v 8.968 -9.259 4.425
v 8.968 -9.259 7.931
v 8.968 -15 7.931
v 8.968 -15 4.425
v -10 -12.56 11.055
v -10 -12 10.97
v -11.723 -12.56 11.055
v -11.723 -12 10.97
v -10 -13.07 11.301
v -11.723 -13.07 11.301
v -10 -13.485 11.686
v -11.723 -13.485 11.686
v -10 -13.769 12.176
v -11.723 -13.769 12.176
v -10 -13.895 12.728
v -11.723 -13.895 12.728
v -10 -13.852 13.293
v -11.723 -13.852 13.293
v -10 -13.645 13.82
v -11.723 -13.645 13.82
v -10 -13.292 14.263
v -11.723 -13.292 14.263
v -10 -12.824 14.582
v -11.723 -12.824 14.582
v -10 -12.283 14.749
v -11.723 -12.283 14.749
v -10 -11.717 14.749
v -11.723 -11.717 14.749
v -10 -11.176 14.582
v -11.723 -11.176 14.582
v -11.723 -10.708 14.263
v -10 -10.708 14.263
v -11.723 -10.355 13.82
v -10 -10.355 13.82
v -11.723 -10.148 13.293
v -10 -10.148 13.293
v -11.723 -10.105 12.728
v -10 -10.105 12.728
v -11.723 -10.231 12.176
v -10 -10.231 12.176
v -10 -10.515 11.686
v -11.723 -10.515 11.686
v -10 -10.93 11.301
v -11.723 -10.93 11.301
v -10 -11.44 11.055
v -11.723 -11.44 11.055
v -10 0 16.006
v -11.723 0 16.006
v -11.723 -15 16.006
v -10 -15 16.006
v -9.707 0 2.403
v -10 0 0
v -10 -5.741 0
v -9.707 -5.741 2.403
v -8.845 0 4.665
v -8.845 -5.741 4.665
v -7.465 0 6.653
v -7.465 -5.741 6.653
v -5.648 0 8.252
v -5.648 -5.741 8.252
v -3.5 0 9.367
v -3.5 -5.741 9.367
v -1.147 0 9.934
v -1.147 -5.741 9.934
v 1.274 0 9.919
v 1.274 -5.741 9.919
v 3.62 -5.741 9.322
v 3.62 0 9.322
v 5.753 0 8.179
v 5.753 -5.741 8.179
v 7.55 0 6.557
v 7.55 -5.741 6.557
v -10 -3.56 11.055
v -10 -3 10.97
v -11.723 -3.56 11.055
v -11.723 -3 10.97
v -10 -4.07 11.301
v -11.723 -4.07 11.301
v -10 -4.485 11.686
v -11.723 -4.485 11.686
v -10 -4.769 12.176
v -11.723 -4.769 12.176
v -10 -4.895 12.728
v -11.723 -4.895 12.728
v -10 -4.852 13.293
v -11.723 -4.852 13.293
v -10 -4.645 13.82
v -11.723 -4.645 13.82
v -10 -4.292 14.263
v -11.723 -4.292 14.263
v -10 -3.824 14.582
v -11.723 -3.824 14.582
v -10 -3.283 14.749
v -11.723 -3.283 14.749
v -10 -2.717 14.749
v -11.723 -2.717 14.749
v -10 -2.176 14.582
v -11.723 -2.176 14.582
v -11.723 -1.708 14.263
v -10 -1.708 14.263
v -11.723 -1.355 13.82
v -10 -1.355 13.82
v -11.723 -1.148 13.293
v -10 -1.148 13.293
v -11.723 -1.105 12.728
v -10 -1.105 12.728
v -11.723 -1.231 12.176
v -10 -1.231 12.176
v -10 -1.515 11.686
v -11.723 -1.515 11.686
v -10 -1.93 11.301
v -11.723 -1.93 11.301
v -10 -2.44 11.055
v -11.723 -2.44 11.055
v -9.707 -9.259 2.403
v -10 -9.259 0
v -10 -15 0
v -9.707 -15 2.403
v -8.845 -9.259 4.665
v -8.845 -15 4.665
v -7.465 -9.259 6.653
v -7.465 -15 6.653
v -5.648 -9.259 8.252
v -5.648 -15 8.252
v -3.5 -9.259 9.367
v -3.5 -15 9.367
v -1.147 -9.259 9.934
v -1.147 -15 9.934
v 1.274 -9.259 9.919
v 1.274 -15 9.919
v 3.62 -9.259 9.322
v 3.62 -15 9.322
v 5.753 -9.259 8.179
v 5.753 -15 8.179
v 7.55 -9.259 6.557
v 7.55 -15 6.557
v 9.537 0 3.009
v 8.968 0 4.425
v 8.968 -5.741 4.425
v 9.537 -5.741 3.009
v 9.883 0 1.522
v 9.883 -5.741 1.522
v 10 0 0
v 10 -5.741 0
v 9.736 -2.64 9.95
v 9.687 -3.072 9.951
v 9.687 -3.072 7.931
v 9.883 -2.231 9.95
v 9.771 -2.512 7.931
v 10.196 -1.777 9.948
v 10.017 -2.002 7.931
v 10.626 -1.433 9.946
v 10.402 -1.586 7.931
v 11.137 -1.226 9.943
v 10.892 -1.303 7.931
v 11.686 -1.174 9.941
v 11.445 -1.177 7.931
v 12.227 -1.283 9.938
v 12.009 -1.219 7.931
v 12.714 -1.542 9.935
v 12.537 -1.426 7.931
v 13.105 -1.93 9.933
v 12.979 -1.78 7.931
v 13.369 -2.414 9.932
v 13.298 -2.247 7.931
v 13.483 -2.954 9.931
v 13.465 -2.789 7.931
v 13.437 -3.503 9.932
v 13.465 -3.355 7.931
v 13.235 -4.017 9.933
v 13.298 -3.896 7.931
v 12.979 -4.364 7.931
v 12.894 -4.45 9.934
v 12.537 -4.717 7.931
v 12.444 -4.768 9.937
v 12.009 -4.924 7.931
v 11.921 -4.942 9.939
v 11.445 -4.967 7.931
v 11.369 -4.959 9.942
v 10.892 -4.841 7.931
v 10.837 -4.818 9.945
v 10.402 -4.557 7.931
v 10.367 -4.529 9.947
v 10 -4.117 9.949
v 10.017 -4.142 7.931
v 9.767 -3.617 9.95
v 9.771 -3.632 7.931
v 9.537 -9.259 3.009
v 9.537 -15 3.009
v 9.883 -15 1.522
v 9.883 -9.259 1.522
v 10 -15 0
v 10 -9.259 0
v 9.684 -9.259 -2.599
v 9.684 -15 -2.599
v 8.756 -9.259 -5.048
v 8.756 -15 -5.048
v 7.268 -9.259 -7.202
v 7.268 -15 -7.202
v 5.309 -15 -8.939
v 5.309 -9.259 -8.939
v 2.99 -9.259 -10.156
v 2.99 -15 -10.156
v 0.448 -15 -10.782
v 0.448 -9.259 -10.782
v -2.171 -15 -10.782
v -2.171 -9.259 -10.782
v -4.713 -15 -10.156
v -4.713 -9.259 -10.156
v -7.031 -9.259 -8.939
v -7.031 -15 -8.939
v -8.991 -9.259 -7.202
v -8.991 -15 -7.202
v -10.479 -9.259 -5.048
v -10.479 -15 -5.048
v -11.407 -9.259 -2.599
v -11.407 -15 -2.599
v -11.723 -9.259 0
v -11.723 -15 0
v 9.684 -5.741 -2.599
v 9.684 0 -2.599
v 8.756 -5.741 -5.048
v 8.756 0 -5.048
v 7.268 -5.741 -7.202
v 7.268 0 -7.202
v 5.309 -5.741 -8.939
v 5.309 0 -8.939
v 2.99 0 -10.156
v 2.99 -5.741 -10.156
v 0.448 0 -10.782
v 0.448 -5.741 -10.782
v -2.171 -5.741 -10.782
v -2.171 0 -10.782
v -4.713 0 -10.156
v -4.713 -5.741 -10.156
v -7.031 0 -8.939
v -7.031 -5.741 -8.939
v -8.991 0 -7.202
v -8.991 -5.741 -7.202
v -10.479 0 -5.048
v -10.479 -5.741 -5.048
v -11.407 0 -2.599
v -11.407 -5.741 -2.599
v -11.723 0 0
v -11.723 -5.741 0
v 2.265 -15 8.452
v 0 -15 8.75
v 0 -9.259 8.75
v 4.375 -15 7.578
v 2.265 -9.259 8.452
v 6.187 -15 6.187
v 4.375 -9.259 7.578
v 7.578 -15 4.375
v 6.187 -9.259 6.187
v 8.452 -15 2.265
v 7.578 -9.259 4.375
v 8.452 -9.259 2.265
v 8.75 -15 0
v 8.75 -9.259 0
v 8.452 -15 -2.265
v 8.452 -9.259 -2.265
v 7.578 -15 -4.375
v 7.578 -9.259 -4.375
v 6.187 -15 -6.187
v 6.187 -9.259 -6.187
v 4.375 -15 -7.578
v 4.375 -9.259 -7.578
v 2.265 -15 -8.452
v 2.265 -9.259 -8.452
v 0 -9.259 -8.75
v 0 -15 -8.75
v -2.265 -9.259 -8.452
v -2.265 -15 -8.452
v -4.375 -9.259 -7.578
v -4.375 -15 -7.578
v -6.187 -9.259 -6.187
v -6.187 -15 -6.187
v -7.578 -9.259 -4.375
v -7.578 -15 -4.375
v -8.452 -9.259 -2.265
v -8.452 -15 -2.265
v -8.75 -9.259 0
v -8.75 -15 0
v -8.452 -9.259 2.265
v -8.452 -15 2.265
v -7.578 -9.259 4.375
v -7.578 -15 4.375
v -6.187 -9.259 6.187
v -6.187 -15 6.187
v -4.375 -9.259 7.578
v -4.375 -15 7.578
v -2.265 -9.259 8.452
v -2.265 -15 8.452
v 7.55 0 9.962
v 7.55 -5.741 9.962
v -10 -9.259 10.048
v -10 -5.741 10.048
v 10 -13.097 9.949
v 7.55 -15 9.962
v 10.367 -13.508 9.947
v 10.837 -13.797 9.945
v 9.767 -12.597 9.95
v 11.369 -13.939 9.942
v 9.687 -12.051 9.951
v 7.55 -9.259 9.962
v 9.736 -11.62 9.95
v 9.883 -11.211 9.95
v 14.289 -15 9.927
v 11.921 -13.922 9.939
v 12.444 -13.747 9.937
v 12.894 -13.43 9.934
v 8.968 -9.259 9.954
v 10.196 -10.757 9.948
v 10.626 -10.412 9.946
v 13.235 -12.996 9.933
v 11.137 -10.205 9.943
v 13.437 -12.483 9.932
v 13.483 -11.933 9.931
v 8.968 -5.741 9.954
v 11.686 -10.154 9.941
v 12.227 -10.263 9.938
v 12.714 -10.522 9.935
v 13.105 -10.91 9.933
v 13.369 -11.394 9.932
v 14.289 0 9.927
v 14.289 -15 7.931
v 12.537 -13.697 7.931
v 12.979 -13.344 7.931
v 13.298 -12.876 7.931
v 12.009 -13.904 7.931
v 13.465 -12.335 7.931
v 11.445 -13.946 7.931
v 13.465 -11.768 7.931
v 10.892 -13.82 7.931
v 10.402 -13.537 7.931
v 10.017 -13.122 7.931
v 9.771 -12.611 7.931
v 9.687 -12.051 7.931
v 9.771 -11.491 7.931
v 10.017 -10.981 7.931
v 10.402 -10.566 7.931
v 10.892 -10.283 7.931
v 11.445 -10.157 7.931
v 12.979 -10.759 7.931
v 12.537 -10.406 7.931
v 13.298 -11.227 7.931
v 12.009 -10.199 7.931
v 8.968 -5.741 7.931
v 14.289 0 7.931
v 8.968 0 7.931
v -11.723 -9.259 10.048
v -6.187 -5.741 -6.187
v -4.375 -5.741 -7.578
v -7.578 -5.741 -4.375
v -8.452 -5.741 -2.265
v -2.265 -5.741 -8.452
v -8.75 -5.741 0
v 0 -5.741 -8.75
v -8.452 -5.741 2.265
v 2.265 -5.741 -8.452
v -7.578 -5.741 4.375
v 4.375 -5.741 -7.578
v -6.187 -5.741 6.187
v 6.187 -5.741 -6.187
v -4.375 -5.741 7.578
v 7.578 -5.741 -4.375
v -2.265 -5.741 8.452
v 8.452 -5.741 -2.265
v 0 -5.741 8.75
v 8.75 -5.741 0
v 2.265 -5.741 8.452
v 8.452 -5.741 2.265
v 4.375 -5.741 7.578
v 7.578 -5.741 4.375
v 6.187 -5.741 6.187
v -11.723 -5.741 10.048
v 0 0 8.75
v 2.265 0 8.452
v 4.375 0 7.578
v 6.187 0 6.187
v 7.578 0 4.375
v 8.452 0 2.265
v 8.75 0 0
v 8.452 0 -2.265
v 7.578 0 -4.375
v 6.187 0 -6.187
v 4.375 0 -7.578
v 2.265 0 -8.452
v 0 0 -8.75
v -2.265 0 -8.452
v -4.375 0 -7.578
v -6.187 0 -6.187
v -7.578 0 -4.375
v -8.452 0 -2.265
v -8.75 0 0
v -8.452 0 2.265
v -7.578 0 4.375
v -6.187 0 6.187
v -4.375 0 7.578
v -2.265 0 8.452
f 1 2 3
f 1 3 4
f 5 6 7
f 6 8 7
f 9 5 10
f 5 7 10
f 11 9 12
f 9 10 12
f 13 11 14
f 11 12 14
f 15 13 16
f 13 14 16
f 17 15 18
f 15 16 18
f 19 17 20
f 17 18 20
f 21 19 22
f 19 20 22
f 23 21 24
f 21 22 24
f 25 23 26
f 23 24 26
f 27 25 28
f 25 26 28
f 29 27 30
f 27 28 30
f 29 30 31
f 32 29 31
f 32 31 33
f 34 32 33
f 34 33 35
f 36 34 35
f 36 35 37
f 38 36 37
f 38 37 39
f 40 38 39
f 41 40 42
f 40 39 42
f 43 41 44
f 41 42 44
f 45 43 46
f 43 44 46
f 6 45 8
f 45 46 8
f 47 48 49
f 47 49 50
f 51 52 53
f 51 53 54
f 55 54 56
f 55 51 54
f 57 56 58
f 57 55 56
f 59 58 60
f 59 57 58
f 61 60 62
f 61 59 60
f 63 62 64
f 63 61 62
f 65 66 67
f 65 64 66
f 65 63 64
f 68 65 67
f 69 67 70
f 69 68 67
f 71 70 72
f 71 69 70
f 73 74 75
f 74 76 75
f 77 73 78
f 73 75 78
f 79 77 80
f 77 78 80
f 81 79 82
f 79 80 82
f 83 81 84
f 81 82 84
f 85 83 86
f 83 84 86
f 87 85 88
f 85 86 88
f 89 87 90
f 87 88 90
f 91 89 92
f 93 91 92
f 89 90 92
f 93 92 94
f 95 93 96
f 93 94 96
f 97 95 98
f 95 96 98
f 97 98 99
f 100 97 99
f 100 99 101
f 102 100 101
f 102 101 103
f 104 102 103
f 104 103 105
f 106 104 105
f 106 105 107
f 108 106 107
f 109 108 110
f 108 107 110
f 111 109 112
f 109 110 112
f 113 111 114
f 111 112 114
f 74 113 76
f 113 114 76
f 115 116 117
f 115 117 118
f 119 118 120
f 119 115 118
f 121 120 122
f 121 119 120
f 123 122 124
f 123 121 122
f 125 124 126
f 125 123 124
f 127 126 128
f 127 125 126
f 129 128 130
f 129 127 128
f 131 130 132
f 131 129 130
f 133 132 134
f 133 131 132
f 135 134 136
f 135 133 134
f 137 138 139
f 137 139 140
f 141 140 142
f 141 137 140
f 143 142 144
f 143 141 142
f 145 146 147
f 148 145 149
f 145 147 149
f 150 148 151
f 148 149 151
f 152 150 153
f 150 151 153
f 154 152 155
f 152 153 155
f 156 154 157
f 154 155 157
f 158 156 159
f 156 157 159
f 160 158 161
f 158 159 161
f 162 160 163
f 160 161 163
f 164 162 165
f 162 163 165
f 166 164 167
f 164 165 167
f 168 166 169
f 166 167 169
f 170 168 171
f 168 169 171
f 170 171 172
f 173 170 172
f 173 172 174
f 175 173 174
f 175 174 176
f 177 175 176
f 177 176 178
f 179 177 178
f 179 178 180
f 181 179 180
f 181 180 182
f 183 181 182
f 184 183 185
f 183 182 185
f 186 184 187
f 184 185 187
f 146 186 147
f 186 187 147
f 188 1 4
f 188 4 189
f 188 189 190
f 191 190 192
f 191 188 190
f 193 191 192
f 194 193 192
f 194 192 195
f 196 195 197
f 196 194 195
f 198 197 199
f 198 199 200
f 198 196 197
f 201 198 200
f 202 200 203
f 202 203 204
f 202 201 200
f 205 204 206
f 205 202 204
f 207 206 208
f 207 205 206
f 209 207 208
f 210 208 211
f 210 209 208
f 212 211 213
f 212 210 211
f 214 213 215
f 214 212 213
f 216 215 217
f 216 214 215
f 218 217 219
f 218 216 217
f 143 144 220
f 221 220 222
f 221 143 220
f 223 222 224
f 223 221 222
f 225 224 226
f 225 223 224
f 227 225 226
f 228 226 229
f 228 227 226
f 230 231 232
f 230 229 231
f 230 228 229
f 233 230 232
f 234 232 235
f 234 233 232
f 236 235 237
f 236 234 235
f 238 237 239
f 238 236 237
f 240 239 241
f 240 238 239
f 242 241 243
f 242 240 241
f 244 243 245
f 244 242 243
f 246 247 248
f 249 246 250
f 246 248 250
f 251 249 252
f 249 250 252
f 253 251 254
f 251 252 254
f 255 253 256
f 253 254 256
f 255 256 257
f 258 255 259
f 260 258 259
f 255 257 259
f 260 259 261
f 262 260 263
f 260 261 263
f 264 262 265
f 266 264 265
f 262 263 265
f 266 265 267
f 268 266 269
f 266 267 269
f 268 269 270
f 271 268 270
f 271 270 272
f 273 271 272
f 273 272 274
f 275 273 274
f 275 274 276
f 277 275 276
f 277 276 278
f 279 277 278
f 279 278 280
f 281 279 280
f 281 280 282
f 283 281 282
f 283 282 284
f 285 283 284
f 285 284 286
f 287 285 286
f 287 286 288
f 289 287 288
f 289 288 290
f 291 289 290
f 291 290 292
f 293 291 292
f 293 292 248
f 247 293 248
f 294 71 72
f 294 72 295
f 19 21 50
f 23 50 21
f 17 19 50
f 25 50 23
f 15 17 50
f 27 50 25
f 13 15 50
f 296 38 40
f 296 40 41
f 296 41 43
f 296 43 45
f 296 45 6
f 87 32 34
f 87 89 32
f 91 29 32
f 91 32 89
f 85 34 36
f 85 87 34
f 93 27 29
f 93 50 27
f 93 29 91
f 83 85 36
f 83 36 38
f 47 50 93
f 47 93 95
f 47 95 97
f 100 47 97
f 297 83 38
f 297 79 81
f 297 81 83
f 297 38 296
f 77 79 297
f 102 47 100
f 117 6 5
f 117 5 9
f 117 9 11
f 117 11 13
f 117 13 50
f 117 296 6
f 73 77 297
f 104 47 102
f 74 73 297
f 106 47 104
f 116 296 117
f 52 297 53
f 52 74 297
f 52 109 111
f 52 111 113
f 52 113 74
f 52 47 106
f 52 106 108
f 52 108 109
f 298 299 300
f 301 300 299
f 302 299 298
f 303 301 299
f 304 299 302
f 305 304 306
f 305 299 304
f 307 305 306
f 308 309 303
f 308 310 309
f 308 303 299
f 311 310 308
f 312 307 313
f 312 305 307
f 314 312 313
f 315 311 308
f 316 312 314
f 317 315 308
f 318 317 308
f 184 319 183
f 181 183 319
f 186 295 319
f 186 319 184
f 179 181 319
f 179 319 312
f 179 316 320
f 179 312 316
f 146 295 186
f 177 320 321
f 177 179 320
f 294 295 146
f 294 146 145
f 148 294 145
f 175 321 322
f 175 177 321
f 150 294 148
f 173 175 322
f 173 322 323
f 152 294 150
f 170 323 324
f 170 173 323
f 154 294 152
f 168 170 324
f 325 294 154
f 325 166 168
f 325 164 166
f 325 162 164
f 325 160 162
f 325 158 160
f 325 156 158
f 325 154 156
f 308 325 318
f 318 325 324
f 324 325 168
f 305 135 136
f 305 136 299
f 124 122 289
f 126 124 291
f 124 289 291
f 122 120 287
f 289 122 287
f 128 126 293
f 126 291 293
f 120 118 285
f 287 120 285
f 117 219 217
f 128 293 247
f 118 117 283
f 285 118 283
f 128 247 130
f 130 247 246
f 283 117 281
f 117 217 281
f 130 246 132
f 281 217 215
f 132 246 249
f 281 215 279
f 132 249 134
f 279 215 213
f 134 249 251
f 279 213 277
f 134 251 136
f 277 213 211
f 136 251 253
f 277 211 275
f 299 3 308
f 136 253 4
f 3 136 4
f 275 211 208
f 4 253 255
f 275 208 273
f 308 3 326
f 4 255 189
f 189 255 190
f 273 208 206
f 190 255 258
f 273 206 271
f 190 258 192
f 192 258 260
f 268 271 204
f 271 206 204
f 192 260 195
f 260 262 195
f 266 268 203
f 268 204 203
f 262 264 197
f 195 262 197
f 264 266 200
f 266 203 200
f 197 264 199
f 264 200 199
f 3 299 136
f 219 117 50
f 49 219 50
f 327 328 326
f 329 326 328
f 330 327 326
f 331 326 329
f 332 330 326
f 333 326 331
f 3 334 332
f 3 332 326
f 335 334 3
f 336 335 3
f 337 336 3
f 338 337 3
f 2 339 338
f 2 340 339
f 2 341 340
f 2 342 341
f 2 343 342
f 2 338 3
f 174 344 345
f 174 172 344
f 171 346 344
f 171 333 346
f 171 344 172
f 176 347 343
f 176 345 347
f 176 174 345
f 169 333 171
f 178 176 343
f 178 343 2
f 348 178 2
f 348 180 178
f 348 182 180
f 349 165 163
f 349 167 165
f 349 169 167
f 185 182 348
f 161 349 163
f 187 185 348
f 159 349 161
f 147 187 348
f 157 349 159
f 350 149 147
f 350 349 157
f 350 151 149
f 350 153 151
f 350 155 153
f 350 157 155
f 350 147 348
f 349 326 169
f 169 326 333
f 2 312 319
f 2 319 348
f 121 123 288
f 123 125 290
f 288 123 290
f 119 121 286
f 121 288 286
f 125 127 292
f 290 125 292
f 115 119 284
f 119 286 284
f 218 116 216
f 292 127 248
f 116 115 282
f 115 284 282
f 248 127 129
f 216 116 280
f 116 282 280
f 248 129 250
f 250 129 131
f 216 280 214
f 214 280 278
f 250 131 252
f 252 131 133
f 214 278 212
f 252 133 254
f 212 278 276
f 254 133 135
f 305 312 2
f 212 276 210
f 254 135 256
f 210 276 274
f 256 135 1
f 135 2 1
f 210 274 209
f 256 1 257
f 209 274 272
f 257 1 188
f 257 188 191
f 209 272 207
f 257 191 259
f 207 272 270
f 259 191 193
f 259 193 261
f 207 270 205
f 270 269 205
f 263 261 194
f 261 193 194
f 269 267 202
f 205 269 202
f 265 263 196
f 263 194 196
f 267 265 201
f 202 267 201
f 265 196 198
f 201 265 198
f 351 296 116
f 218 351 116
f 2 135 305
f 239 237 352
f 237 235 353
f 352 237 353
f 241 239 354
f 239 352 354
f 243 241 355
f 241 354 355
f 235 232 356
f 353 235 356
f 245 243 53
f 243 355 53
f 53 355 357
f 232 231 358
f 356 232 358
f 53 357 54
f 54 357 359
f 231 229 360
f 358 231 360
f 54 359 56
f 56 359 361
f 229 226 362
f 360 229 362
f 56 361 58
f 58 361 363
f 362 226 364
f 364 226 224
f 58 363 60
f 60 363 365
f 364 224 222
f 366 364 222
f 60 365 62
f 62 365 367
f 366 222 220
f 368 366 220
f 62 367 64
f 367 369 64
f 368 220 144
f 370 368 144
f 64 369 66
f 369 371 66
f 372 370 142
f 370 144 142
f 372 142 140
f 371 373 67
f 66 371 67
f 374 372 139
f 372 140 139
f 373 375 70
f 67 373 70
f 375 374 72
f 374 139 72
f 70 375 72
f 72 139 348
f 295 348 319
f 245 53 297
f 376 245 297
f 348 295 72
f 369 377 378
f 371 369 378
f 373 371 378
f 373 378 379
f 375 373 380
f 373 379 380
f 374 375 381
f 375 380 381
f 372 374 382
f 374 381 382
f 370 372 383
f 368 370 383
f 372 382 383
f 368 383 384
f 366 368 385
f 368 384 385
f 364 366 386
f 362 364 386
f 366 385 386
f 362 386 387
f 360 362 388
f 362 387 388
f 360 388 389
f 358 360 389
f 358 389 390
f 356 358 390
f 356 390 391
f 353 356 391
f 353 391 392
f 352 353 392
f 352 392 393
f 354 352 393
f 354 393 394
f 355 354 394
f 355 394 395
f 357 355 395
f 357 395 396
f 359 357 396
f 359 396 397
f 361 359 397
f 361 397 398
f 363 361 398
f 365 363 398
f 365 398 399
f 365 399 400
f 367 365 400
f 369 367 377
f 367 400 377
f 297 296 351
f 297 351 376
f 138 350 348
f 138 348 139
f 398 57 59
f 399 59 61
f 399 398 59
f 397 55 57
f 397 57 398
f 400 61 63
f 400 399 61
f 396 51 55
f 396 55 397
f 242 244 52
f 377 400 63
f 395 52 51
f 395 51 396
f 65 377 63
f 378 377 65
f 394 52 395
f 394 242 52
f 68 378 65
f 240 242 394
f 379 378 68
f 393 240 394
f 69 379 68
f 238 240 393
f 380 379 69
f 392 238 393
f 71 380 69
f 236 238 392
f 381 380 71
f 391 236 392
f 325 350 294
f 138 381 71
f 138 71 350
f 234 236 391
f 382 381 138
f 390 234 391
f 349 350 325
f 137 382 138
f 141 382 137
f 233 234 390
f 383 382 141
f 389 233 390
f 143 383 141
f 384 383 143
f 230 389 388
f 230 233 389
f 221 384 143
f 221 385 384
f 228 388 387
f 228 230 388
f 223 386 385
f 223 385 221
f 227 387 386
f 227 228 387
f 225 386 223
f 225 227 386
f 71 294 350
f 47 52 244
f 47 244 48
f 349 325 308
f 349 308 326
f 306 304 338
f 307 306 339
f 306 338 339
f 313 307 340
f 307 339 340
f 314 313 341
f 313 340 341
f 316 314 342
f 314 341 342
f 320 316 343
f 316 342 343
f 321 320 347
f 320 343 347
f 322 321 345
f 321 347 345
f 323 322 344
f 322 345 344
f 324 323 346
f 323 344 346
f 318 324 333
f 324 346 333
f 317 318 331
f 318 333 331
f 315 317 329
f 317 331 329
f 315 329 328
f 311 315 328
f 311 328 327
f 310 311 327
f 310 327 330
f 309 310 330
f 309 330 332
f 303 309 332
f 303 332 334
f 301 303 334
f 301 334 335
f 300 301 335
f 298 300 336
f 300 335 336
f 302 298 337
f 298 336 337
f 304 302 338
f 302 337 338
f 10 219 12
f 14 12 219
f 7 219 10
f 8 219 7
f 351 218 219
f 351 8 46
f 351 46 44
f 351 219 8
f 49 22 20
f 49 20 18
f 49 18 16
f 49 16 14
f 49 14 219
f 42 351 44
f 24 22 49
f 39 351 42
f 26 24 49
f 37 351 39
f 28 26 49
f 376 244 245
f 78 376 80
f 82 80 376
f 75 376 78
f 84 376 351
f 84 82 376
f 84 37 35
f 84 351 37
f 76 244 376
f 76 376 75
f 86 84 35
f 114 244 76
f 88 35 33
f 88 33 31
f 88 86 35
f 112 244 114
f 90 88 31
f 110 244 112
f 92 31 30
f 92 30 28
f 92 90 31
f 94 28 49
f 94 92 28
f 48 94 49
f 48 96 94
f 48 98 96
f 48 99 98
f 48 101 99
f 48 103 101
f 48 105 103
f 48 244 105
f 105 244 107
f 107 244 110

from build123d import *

# Parameters (mm, degrees)
SKETCH1_R           = 8.75
BOSS_EXTRUDE1_DEPTH = 15
SKETCH2_R           = 1.9
CUT_EXTRUDE1_DEPTH  = 20
SKETCH3_R           = 1.9
CUT_EXTRUDE2_DEPTH  = 10
SKETCH4_W           = 24.600517232
SKETCH4_H           = 3.517349106
SKETCH4_W_2         = 3.50600932
SKETCH4_W_3         = 2.117023419
CUT_EXTRUDE3_DEPTH  = 129
SKETCH5_W           = 14.928012143
SKETCH5_H           = 3.517349106
CUT_EXTRUDE4_DEPTH  = 39.5


with BuildPart() as part:
    # Sketch1 → Boss-Extrude1 (new body)
    with BuildSketch(Plane(origin=(0, 0, 0), x_dir=(1, 0, 0), z_dir=(0, 1, 0))):
        with BuildLine():
            Line((7.55, -6.557247898), (7.55, -9.961620247))
            Line((7.55, -9.961620247), (14.289149279, -9.92724627))
            Line((14.289149279, -9.92724627), (14.289149279, -7.931016803))
            Line((14.289149279, -7.931016803), (8.967681349, -7.931016803))
            Line((8.967681349, -7.931016803), (8.967681349, -4.425007483))
            ThreePointArc((8.967681349, -4.425007483), (9.738501258, -2.271914007), (10, 0))
            ThreePointArc((10, 0), (-0.861319558, 10.861319558), (-11.722639117, 0))
            Line((-11.722639117, 0), (-11.722639117, -16.005864092))
            Line((-11.722639117, -16.005864092), (-10, -16.005864092))
            Line((-10, -16.005864092), (-10, 0))
            ThreePointArc((-10, 0), (-3.5, -9.367496998), (7.55, -6.557247898))
        make_face()
        with Locations(Location((0, 0, 0), (0, 0, 270))):
            Circle(SKETCH1_R, mode=Mode.SUBTRACT)
    extrude(amount=-BOSS_EXTRUDE1_DEPTH)

    # Sketch2 → Cut-Extrude1 (cut, symmetric)
    with BuildSketch(Plane.ZY.offset(10.823854245)):
        with Locations(Location((12.870484291, -12, 0), (0, 0, 180))):
            Circle(SKETCH2_R)
        with Locations(Location((12.870484291, -3, 0), (0, 0, 180))):
            Circle(SKETCH2_R)
    extrude(amount=CUT_EXTRUDE1_DEPTH, both=True, mode=Mode.SUBTRACT)

    # Sketch3 → Cut-Extrude2 (cut)
    with BuildSketch(Plane(origin=(0, 0, 7.931016803), x_dir=(-1, 0, 0), z_dir=(0, 0, -1))):
        with Locations((-11.586638558, -12.051447382)):
            Circle(SKETCH3_R)
        with Locations((-11.586638558, -3.07185738)):
            Circle(SKETCH3_R)
    extrude(amount=-CUT_EXTRUDE2_DEPTH, mode=Mode.SUBTRACT)

    # Sketch4 → Cut-Extrude3 (cut)
    with BuildSketch(Plane(origin=(8.967681349, 0, 0), x_dir=(0, 0, -1), z_dir=(1, 0, 0))):
        with Locations((7.875251133, -7.5)):
            Rectangle(SKETCH4_W, SKETCH4_H)
        with Locations((-6.178012143, -7.5)):
            Rectangle(SKETCH4_W_2, SKETCH4_H)
        with Locations((-8.989528513, -7.5)):
            Rectangle(SKETCH4_W_3, SKETCH4_H)
    extrude(amount=-CUT_EXTRUDE3_DEPTH, mode=Mode.SUBTRACT)

    # Sketch5 → Cut-Extrude4 (cut, symmetric)
    with BuildSketch(Plane(origin=(-10, 0, 0), x_dir=(0, 0, -1), z_dir=(1, 0, 0))):
        with Locations((1.285993928, -7.5)):
            Rectangle(SKETCH5_W, SKETCH5_H)
    extrude(amount=CUT_EXTRUDE4_DEPTH, both=True, mode=Mode.SUBTRACT)


solid = part.part
